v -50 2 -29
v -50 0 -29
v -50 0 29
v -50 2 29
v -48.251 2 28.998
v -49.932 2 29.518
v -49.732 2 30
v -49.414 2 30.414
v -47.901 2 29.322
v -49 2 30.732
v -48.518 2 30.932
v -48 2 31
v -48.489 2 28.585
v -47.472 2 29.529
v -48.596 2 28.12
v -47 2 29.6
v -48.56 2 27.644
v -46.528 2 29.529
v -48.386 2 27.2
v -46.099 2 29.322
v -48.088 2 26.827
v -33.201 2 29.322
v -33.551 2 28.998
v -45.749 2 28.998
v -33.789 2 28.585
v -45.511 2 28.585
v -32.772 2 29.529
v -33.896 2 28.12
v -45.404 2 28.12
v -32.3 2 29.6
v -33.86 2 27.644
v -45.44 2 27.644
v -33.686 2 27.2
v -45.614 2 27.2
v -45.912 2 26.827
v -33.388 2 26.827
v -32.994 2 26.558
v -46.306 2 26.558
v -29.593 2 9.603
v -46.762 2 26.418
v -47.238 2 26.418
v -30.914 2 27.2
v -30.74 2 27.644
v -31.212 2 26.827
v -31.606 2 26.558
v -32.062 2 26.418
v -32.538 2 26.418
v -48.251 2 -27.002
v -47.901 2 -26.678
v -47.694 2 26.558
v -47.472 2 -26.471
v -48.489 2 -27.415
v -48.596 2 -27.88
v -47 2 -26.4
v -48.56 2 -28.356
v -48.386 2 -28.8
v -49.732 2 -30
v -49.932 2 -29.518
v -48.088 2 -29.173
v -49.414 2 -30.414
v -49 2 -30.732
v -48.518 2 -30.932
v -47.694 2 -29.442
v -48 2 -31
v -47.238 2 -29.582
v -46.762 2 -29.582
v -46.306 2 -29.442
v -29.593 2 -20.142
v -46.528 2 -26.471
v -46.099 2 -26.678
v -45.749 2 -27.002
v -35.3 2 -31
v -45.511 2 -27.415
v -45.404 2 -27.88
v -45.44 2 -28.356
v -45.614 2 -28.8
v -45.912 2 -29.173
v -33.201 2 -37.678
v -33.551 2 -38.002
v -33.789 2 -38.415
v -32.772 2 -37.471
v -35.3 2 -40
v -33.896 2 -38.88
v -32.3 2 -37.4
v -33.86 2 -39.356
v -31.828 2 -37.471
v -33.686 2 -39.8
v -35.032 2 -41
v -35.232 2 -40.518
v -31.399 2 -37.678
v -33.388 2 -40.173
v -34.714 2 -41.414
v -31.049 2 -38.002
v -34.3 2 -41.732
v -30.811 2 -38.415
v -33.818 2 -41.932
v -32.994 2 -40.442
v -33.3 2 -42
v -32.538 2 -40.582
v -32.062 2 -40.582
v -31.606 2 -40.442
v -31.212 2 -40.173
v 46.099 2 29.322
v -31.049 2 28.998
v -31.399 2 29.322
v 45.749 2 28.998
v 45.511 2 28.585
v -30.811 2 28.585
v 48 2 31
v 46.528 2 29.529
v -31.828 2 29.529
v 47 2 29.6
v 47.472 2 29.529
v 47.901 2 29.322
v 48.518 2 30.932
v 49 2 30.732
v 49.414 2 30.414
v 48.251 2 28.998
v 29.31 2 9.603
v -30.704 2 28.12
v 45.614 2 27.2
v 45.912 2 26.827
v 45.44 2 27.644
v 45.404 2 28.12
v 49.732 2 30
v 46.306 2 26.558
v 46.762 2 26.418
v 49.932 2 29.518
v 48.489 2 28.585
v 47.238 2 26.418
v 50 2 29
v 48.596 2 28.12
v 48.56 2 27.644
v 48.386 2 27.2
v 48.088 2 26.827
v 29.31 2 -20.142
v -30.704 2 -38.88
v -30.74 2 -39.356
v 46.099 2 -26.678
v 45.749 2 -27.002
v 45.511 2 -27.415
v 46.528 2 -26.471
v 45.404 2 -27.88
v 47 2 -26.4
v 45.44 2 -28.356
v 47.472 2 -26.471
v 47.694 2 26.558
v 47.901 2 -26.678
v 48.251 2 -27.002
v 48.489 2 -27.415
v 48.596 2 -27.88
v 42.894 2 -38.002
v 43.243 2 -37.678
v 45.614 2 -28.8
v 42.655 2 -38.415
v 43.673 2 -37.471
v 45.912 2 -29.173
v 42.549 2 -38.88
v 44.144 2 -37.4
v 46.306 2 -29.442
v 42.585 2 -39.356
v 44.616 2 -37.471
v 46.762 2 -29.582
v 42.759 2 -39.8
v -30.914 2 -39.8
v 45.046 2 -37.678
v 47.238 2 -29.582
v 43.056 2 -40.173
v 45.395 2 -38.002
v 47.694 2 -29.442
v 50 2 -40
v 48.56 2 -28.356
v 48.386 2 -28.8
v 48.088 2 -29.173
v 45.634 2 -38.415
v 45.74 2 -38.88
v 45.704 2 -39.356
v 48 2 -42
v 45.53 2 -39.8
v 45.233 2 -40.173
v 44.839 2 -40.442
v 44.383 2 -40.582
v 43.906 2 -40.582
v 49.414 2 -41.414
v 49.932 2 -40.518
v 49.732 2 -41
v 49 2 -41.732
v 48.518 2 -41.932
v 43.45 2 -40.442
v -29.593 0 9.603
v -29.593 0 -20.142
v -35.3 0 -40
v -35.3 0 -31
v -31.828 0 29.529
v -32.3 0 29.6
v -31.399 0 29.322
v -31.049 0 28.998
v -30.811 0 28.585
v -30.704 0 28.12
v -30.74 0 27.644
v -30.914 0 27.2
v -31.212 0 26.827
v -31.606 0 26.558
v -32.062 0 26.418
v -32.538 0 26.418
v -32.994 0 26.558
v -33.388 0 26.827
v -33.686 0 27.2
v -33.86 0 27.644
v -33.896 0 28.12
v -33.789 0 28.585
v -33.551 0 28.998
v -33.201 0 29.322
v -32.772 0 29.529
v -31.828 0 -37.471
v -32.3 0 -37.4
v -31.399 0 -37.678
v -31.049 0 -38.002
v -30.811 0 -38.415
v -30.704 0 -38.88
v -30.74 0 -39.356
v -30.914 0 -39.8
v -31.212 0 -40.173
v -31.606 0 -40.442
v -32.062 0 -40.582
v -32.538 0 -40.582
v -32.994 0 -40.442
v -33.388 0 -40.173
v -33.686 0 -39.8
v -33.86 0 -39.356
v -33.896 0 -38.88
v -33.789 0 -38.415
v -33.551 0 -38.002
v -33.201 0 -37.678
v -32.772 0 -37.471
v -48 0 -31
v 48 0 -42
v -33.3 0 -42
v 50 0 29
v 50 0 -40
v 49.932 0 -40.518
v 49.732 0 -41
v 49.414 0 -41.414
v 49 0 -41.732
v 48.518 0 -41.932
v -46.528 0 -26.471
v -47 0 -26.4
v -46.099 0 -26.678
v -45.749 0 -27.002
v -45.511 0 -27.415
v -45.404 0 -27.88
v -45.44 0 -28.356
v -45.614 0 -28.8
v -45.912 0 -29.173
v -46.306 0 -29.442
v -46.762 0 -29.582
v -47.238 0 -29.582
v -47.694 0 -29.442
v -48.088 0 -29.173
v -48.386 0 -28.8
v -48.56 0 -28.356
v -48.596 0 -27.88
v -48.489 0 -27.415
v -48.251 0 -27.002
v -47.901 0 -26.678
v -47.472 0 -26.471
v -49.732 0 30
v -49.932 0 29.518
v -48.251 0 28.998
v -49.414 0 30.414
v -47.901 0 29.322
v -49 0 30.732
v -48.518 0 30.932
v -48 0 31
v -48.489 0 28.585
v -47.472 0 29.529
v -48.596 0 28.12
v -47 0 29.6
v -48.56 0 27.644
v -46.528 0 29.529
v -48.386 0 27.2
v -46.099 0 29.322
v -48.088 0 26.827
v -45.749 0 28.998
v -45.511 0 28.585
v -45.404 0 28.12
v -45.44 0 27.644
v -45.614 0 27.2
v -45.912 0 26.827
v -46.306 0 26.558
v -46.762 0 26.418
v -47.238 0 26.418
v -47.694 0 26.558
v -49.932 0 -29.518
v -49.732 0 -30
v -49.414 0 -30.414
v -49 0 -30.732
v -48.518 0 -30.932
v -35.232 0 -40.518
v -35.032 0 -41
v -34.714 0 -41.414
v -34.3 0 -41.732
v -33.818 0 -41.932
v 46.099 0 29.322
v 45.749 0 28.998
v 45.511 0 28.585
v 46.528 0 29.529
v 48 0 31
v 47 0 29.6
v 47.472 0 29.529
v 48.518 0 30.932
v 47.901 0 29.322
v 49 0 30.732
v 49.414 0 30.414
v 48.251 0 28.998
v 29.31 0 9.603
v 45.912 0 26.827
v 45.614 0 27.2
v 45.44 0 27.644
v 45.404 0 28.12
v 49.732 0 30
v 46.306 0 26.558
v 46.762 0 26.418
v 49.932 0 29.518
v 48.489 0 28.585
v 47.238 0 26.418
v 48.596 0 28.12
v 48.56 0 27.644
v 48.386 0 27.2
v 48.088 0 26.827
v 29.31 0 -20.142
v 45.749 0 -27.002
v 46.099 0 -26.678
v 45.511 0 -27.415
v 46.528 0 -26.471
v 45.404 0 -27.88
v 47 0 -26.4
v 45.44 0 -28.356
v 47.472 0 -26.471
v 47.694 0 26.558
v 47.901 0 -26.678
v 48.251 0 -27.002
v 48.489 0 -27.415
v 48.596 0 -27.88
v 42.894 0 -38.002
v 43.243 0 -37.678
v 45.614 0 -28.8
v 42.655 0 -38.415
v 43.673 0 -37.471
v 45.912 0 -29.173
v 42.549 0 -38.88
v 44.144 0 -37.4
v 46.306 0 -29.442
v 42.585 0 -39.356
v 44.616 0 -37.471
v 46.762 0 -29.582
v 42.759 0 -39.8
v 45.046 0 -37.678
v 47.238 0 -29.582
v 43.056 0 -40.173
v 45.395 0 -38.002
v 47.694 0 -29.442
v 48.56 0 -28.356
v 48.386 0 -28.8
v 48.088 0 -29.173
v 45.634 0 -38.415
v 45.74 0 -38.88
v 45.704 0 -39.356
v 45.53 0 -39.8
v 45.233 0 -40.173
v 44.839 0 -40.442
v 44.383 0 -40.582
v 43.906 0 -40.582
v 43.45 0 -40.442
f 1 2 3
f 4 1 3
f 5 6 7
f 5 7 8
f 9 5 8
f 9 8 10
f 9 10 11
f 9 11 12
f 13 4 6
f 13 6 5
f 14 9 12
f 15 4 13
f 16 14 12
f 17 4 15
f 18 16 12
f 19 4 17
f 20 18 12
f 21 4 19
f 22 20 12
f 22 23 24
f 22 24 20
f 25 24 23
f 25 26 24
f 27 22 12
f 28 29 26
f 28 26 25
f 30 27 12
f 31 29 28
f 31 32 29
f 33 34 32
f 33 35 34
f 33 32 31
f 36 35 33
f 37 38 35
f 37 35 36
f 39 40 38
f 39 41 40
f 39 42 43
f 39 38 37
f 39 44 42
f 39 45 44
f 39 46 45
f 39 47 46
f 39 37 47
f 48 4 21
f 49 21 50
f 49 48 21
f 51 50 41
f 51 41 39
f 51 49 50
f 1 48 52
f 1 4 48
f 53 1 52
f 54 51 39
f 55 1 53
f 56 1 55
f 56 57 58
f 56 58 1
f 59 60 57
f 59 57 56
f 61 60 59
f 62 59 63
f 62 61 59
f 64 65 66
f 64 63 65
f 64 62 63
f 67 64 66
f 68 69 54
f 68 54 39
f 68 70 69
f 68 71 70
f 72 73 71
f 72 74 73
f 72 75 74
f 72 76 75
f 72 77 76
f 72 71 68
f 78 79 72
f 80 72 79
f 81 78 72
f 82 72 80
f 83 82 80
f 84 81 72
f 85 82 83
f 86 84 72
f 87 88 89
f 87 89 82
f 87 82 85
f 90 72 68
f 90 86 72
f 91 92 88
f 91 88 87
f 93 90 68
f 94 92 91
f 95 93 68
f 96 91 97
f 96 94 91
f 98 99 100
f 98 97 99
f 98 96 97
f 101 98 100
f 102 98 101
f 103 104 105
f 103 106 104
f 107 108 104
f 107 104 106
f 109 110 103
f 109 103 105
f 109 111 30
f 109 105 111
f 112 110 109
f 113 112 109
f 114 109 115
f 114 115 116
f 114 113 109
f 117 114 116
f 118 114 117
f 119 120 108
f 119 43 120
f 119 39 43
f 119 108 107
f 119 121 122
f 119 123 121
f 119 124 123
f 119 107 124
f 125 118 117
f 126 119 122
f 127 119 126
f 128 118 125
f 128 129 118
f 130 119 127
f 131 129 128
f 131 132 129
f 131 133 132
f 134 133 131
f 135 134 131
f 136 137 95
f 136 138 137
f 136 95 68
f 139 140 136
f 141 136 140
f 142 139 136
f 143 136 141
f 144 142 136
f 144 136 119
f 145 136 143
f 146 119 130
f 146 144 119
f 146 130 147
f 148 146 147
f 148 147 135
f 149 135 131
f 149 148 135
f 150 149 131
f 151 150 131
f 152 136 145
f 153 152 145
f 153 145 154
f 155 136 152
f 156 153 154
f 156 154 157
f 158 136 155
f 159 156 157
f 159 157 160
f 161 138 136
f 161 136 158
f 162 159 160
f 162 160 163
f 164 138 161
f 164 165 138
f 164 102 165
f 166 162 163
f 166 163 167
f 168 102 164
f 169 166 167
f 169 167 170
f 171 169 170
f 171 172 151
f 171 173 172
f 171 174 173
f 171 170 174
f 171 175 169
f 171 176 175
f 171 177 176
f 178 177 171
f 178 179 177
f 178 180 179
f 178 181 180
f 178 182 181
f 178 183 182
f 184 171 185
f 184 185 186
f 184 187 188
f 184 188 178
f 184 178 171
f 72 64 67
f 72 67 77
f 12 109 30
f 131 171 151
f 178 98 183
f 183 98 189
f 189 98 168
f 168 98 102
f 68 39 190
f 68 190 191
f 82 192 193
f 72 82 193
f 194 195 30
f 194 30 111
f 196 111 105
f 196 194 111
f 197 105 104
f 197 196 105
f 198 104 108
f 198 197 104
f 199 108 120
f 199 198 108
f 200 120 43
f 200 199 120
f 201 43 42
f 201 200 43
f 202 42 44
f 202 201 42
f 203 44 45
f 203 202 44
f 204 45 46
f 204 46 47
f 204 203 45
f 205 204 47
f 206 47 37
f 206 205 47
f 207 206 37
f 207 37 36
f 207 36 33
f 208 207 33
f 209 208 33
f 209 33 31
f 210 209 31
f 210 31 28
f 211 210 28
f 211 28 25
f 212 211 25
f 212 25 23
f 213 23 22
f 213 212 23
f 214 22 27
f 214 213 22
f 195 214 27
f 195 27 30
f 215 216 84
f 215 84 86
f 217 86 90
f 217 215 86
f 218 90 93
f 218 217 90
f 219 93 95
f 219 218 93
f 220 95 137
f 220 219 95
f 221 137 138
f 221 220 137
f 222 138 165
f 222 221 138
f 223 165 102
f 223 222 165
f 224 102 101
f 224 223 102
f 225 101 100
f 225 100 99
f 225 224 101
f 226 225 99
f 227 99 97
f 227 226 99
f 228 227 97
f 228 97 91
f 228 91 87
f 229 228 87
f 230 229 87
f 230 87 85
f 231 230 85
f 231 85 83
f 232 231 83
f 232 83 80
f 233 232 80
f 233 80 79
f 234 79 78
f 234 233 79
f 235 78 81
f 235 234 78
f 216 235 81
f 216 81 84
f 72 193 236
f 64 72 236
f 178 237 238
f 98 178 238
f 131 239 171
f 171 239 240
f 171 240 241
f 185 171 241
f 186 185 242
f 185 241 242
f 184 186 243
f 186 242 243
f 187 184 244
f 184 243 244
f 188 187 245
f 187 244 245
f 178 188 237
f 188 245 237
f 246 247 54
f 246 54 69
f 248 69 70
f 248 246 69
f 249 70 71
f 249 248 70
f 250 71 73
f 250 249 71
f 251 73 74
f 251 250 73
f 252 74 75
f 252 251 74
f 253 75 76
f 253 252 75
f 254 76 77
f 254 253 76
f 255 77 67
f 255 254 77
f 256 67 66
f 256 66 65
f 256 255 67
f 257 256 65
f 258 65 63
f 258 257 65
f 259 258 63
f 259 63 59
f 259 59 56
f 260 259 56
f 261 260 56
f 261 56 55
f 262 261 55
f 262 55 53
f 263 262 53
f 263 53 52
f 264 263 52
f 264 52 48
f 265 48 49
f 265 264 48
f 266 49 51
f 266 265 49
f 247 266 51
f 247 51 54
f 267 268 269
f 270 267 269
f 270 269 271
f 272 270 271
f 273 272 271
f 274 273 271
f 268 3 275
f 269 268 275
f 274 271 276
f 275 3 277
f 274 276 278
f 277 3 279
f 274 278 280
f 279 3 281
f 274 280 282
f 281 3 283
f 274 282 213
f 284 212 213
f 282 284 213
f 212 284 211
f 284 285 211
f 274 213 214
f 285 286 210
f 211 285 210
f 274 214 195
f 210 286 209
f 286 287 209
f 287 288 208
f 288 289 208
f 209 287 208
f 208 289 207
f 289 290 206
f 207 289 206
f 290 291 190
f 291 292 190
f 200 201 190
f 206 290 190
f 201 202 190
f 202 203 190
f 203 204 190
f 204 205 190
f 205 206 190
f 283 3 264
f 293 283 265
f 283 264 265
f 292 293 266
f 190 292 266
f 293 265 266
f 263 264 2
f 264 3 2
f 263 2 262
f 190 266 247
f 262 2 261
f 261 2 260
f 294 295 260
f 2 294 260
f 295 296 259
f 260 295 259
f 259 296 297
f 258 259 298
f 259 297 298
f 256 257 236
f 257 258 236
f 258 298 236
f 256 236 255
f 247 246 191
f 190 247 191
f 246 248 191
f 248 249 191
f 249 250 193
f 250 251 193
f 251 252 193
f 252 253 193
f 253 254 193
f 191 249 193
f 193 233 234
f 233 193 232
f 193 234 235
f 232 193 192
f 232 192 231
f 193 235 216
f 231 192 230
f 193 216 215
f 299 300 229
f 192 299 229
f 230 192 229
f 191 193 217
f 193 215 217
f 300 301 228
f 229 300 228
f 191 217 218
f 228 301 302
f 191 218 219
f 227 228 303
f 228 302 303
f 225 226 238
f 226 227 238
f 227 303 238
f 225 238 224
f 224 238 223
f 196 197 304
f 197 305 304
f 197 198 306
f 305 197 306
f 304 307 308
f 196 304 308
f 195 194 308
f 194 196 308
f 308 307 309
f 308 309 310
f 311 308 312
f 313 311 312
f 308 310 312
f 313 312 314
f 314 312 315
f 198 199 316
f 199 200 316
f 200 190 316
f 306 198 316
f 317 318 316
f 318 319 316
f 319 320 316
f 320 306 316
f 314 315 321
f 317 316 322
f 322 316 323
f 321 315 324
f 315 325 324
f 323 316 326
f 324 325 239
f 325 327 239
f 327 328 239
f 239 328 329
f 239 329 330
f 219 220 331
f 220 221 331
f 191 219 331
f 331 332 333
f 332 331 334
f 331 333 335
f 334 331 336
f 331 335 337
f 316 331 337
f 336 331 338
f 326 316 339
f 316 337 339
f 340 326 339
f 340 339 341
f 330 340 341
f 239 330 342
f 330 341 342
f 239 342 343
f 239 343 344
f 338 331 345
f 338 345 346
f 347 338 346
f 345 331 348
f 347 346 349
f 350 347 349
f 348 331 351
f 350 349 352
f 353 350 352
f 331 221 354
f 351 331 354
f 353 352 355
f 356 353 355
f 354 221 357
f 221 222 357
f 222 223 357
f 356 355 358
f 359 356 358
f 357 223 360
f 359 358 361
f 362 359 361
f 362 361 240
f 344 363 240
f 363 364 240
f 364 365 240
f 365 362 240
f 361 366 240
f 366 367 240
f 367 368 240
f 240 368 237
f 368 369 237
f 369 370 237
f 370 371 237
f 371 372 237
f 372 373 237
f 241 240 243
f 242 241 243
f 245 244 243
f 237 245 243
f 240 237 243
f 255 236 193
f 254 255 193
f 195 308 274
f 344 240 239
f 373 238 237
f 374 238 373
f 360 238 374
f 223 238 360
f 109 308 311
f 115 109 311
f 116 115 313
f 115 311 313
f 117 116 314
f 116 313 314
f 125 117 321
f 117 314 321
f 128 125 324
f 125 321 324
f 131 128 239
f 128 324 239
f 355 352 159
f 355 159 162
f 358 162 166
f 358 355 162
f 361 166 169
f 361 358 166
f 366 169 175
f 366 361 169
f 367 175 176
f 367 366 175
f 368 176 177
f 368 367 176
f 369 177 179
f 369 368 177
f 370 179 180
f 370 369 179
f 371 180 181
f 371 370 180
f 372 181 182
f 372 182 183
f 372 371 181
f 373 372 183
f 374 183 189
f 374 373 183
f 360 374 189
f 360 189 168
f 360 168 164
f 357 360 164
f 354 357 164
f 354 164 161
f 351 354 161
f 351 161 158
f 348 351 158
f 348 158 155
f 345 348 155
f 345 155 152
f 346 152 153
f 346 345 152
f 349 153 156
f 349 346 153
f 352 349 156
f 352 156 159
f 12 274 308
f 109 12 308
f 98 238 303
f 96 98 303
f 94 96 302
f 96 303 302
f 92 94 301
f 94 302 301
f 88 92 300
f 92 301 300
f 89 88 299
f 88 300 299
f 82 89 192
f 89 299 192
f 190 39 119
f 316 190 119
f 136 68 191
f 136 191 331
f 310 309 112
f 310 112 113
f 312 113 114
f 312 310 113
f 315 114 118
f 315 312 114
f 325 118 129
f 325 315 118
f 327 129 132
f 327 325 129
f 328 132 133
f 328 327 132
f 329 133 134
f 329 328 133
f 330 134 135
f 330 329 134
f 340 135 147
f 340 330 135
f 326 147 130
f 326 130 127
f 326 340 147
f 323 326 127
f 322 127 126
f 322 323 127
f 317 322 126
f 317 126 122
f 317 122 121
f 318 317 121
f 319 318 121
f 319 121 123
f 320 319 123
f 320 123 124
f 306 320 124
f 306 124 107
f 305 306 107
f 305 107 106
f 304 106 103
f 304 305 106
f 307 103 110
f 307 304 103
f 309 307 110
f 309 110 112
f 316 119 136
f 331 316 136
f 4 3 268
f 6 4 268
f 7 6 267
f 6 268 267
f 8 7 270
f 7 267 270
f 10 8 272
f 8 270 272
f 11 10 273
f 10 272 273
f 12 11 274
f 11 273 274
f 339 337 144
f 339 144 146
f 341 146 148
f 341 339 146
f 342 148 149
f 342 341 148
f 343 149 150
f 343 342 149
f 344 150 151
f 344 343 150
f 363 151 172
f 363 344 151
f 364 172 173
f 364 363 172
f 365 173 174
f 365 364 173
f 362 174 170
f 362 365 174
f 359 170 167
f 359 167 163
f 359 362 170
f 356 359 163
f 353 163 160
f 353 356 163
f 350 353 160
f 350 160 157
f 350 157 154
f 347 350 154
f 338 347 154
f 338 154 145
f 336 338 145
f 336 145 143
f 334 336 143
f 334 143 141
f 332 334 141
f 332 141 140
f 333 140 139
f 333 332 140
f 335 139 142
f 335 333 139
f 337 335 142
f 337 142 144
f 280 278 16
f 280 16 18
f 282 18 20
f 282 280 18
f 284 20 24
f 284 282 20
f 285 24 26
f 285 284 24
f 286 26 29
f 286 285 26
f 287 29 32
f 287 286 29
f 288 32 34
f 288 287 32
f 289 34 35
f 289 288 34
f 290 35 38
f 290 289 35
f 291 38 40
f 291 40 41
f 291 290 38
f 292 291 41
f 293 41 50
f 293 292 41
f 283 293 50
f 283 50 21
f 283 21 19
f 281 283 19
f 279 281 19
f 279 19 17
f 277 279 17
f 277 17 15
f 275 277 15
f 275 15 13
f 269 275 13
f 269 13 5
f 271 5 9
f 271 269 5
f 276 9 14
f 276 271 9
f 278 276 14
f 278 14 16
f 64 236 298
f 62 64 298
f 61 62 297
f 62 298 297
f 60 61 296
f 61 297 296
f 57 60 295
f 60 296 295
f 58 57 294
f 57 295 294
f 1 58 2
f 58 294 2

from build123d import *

# Parameters (mm, degrees)
SKETCH_1_R          = 1.6
EXTRUDE_1_DEPTH     = 2
CUT_EXTRUDE_1_REACH = 67.33
SKETCH_2_W          = 58.902173398
SKETCH_2_H          = 29.745647313


with BuildPart() as part:
    # 草图1 → 凸台-拉伸1 (new body)
    # profile 1 of 3: a face of its own
    with BuildSketch(Plane(origin=(0, 0, 0), x_dir=(1, 0, 0), z_dir=(0, 1, 0))):
        with BuildLine():
            Line((-35.3, -31), (48, -31))
            ThreePointArc((48, -31), (49.414213562, -30.414213562), (50, -29))
            Line((50, -29), (50, 29))
            ThreePointArc((50, 29), (49.414213562, 30.414213562), (48, 31))
            Line((48, 31), (-35.3, 31))
            Line((-35.3, 31), (-35.3, -31))
        make_face()
        with Locations(Location((-32.3, -28, 0), (0, 0, 270))):
            Circle(SKETCH_1_R, mode=Mode.SUBTRACT)
        with Locations(Location((47, -28, 0), (0, 0, 270))):
            Circle(SKETCH_1_R, mode=Mode.SUBTRACT)
        with Locations(Location((47, 28, 0), (0, 0, 270))):
            Circle(SKETCH_1_R, mode=Mode.SUBTRACT)
    # profile 2 of 3: a face of its own
    with BuildSketch(Plane(origin=(0, 0, 0), x_dir=(1, 0, 0), z_dir=(0, 1, 0))):
        with BuildLine():
            Line((-48, -31), (-35.3, -31))
            Line((-35.3, -31), (-35.3, 31))
            Line((-35.3, 31), (-48, 31))
            ThreePointArc((-48, 31), (-49.414213562, 30.414213562), (-50, 29))
            Line((-50, 29), (-50, -29))
            ThreePointArc((-50, -29), (-49.414213562, -30.414213562), (-48, -31))
        make_face()
        with Locations(Location((-47, -28, 0), (0, 0, 270))):
            Circle(SKETCH_1_R, mode=Mode.SUBTRACT)
        with Locations(Location((-47, 28, 0), (0, 0, 270))):
            Circle(SKETCH_1_R, mode=Mode.SUBTRACT)
    # profile 3 of 3: a face of its own
    with BuildSketch(Plane(origin=(0, 0, 0), x_dir=(1, 0, 0), z_dir=(0, 1, 0))):
        with BuildLine():
            Line((-35.3, 40), (-35.3, 31))
            Line((-35.3, 31), (48, 31))
            ThreePointArc((48, 31), (49.414213562, 30.414213562), (50, 29))
            Line((50, 29), (50, 40))
            ThreePointArc((50, 40), (49.414213562, 41.414213562), (48, 42))
            Line((48, 42), (-33.3, 42))
            ThreePointArc((-33.3, 42), (-34.714213562, 41.414213562), (-35.3, 40))
        make_face()
        with Locations(Location((-32.3, 39, 0), (0, 0, 270))):
            Circle(SKETCH_1_R, mode=Mode.SUBTRACT)
        with Locations(Location((44.144452232, 39, 0), (0, 0, 270))):
            Circle(SKETCH_1_R, mode=Mode.SUBTRACT)
    extrude(amount=EXTRUDE_1_DEPTH)

    # 草图2 → 切除-拉伸1 (cut, up to next)
    with BuildSketch(Plane(origin=(0, 2, 0), x_dir=(1, 0, 0), z_dir=(0, 1, 0)), mode=Mode.PRIVATE) as cut_extrude_1_sk1:
        with Locations((-0.141416386, 5.269425073)):
            Rectangle(SKETCH_2_W, SKETCH_2_H)
    cut_extrude_1_tool1 = extrude(cut_extrude_1_sk1.sketch, amount=-CUT_EXTRUDE_1_REACH, mode=Mode.PRIVATE) & part.part
    add(cut_extrude_1_tool1.solids().sort_by_distance((-0.141416, 2, -5.269425))[0], mode=Mode.SUBTRACT)


solid = part.part
